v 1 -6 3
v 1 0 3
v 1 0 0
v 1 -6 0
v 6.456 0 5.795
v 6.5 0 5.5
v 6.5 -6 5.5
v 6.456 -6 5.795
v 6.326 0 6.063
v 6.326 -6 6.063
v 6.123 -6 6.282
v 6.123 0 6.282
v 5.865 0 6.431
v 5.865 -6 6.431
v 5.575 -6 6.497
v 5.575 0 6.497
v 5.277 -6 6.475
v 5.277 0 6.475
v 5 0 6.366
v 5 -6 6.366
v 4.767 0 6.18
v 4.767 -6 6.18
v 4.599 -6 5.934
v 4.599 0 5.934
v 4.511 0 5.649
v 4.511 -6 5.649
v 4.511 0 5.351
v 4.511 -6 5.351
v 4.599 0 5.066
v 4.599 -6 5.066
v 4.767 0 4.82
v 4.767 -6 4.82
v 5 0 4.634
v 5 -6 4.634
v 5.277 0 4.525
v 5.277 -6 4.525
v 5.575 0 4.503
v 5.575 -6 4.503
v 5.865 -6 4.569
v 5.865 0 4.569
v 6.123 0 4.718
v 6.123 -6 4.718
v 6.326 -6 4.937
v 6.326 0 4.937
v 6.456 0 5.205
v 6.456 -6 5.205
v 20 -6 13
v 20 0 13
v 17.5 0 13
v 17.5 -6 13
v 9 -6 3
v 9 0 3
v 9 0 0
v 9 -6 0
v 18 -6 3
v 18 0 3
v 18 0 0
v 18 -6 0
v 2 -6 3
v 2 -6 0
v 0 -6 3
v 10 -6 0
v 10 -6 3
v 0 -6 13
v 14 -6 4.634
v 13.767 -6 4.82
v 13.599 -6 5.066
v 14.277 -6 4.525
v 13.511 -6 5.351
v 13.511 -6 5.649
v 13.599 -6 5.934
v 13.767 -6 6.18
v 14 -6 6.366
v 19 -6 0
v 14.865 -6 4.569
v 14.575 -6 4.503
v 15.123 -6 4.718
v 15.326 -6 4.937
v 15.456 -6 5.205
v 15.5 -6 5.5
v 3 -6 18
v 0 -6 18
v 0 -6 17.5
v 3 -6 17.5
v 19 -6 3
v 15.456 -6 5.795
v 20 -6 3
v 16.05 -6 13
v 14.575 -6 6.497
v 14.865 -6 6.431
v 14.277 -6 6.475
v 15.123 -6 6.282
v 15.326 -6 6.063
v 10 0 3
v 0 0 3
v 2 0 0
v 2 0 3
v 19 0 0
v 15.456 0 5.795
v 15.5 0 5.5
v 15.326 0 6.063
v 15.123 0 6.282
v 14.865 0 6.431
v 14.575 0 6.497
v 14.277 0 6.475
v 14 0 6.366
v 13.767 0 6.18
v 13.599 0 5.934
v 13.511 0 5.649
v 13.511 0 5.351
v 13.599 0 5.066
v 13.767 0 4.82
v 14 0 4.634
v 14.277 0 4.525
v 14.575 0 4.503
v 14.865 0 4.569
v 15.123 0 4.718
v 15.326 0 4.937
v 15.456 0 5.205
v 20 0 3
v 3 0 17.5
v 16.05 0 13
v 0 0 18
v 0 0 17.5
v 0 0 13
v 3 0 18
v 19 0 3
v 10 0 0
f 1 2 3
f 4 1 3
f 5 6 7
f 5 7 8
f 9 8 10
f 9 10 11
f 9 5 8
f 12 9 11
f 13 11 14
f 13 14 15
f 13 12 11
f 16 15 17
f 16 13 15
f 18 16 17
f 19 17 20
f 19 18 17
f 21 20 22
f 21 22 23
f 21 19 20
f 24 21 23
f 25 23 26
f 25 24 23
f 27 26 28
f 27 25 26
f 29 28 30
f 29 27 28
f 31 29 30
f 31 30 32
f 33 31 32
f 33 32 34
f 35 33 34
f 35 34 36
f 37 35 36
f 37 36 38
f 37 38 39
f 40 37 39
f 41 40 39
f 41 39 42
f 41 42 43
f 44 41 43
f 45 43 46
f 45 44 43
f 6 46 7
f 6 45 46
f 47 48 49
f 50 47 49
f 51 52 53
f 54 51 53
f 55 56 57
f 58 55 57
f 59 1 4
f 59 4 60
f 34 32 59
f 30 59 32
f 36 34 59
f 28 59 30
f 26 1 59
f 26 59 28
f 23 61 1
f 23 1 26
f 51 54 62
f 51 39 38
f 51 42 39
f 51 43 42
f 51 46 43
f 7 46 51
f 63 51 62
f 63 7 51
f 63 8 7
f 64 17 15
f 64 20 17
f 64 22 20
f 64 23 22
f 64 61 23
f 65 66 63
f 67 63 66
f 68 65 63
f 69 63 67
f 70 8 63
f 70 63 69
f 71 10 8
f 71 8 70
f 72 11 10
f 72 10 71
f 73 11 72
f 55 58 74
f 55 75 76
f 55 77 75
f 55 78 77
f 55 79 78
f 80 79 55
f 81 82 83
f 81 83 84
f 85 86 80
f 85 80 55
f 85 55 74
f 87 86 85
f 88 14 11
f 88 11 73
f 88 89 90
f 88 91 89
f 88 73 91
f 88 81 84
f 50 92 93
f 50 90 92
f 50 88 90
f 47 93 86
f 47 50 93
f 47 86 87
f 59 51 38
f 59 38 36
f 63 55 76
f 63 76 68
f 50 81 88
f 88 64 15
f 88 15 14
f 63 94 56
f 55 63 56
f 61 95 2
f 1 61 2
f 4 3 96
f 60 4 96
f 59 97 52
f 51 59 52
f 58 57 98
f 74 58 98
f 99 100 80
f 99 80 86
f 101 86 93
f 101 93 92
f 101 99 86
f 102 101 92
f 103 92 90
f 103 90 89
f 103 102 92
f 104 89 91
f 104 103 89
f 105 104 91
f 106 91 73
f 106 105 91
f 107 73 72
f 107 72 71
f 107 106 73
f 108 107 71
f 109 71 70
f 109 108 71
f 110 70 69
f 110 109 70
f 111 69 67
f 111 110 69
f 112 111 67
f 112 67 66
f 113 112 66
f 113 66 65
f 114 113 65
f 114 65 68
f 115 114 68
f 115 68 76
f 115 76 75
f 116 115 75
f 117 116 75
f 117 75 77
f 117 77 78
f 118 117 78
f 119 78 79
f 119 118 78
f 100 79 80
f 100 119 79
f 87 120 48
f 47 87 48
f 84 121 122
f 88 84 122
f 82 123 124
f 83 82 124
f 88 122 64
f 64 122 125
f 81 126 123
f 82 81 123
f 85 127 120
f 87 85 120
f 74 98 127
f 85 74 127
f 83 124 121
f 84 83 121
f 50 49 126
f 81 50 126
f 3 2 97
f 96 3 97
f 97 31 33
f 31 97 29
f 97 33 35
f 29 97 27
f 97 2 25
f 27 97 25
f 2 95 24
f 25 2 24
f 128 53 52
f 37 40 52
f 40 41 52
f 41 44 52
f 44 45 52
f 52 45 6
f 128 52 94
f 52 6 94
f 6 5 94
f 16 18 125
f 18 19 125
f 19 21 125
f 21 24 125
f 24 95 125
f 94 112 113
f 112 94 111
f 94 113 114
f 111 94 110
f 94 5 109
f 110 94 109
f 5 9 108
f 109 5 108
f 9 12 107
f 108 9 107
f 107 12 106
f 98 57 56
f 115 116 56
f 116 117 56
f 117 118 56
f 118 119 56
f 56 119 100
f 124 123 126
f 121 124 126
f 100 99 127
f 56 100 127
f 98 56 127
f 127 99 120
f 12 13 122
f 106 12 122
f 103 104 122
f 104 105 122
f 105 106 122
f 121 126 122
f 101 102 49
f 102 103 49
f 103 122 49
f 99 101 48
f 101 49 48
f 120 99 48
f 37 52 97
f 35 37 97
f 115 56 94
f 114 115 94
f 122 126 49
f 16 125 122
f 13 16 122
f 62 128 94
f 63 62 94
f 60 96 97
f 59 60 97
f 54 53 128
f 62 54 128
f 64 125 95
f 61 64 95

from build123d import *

# Parameters (mm, degrees)
SKETCH_R  = 1
PAD_DEPTH = 6


with BuildPart() as part:
    # Sketch → Pad (new body)
    with BuildSketch(Plane.XZ):
        Polygon((0, 13), (0, 3), (1, 3), (1, 0), (2, 0), (2, 3), (9, 3), (9, 0), (10, 0), (10, 3), (18, 3), (18, 0), (19, 0), (19, 3), (20, 3), (20, 13), (17.5, 13), (3, 18), (0, 18), (0, 17.5), (3, 17.5), (16.05, 13), align=None)
        with Locations((5.5, 5.5)):
            Circle(SKETCH_R, mode=Mode.SUBTRACT)
        with Locations((14.5, 5.5)):
            Circle(SKETCH_R, mode=Mode.SUBTRACT)
    extrude(amount=PAD_DEPTH)


solid = part.part
